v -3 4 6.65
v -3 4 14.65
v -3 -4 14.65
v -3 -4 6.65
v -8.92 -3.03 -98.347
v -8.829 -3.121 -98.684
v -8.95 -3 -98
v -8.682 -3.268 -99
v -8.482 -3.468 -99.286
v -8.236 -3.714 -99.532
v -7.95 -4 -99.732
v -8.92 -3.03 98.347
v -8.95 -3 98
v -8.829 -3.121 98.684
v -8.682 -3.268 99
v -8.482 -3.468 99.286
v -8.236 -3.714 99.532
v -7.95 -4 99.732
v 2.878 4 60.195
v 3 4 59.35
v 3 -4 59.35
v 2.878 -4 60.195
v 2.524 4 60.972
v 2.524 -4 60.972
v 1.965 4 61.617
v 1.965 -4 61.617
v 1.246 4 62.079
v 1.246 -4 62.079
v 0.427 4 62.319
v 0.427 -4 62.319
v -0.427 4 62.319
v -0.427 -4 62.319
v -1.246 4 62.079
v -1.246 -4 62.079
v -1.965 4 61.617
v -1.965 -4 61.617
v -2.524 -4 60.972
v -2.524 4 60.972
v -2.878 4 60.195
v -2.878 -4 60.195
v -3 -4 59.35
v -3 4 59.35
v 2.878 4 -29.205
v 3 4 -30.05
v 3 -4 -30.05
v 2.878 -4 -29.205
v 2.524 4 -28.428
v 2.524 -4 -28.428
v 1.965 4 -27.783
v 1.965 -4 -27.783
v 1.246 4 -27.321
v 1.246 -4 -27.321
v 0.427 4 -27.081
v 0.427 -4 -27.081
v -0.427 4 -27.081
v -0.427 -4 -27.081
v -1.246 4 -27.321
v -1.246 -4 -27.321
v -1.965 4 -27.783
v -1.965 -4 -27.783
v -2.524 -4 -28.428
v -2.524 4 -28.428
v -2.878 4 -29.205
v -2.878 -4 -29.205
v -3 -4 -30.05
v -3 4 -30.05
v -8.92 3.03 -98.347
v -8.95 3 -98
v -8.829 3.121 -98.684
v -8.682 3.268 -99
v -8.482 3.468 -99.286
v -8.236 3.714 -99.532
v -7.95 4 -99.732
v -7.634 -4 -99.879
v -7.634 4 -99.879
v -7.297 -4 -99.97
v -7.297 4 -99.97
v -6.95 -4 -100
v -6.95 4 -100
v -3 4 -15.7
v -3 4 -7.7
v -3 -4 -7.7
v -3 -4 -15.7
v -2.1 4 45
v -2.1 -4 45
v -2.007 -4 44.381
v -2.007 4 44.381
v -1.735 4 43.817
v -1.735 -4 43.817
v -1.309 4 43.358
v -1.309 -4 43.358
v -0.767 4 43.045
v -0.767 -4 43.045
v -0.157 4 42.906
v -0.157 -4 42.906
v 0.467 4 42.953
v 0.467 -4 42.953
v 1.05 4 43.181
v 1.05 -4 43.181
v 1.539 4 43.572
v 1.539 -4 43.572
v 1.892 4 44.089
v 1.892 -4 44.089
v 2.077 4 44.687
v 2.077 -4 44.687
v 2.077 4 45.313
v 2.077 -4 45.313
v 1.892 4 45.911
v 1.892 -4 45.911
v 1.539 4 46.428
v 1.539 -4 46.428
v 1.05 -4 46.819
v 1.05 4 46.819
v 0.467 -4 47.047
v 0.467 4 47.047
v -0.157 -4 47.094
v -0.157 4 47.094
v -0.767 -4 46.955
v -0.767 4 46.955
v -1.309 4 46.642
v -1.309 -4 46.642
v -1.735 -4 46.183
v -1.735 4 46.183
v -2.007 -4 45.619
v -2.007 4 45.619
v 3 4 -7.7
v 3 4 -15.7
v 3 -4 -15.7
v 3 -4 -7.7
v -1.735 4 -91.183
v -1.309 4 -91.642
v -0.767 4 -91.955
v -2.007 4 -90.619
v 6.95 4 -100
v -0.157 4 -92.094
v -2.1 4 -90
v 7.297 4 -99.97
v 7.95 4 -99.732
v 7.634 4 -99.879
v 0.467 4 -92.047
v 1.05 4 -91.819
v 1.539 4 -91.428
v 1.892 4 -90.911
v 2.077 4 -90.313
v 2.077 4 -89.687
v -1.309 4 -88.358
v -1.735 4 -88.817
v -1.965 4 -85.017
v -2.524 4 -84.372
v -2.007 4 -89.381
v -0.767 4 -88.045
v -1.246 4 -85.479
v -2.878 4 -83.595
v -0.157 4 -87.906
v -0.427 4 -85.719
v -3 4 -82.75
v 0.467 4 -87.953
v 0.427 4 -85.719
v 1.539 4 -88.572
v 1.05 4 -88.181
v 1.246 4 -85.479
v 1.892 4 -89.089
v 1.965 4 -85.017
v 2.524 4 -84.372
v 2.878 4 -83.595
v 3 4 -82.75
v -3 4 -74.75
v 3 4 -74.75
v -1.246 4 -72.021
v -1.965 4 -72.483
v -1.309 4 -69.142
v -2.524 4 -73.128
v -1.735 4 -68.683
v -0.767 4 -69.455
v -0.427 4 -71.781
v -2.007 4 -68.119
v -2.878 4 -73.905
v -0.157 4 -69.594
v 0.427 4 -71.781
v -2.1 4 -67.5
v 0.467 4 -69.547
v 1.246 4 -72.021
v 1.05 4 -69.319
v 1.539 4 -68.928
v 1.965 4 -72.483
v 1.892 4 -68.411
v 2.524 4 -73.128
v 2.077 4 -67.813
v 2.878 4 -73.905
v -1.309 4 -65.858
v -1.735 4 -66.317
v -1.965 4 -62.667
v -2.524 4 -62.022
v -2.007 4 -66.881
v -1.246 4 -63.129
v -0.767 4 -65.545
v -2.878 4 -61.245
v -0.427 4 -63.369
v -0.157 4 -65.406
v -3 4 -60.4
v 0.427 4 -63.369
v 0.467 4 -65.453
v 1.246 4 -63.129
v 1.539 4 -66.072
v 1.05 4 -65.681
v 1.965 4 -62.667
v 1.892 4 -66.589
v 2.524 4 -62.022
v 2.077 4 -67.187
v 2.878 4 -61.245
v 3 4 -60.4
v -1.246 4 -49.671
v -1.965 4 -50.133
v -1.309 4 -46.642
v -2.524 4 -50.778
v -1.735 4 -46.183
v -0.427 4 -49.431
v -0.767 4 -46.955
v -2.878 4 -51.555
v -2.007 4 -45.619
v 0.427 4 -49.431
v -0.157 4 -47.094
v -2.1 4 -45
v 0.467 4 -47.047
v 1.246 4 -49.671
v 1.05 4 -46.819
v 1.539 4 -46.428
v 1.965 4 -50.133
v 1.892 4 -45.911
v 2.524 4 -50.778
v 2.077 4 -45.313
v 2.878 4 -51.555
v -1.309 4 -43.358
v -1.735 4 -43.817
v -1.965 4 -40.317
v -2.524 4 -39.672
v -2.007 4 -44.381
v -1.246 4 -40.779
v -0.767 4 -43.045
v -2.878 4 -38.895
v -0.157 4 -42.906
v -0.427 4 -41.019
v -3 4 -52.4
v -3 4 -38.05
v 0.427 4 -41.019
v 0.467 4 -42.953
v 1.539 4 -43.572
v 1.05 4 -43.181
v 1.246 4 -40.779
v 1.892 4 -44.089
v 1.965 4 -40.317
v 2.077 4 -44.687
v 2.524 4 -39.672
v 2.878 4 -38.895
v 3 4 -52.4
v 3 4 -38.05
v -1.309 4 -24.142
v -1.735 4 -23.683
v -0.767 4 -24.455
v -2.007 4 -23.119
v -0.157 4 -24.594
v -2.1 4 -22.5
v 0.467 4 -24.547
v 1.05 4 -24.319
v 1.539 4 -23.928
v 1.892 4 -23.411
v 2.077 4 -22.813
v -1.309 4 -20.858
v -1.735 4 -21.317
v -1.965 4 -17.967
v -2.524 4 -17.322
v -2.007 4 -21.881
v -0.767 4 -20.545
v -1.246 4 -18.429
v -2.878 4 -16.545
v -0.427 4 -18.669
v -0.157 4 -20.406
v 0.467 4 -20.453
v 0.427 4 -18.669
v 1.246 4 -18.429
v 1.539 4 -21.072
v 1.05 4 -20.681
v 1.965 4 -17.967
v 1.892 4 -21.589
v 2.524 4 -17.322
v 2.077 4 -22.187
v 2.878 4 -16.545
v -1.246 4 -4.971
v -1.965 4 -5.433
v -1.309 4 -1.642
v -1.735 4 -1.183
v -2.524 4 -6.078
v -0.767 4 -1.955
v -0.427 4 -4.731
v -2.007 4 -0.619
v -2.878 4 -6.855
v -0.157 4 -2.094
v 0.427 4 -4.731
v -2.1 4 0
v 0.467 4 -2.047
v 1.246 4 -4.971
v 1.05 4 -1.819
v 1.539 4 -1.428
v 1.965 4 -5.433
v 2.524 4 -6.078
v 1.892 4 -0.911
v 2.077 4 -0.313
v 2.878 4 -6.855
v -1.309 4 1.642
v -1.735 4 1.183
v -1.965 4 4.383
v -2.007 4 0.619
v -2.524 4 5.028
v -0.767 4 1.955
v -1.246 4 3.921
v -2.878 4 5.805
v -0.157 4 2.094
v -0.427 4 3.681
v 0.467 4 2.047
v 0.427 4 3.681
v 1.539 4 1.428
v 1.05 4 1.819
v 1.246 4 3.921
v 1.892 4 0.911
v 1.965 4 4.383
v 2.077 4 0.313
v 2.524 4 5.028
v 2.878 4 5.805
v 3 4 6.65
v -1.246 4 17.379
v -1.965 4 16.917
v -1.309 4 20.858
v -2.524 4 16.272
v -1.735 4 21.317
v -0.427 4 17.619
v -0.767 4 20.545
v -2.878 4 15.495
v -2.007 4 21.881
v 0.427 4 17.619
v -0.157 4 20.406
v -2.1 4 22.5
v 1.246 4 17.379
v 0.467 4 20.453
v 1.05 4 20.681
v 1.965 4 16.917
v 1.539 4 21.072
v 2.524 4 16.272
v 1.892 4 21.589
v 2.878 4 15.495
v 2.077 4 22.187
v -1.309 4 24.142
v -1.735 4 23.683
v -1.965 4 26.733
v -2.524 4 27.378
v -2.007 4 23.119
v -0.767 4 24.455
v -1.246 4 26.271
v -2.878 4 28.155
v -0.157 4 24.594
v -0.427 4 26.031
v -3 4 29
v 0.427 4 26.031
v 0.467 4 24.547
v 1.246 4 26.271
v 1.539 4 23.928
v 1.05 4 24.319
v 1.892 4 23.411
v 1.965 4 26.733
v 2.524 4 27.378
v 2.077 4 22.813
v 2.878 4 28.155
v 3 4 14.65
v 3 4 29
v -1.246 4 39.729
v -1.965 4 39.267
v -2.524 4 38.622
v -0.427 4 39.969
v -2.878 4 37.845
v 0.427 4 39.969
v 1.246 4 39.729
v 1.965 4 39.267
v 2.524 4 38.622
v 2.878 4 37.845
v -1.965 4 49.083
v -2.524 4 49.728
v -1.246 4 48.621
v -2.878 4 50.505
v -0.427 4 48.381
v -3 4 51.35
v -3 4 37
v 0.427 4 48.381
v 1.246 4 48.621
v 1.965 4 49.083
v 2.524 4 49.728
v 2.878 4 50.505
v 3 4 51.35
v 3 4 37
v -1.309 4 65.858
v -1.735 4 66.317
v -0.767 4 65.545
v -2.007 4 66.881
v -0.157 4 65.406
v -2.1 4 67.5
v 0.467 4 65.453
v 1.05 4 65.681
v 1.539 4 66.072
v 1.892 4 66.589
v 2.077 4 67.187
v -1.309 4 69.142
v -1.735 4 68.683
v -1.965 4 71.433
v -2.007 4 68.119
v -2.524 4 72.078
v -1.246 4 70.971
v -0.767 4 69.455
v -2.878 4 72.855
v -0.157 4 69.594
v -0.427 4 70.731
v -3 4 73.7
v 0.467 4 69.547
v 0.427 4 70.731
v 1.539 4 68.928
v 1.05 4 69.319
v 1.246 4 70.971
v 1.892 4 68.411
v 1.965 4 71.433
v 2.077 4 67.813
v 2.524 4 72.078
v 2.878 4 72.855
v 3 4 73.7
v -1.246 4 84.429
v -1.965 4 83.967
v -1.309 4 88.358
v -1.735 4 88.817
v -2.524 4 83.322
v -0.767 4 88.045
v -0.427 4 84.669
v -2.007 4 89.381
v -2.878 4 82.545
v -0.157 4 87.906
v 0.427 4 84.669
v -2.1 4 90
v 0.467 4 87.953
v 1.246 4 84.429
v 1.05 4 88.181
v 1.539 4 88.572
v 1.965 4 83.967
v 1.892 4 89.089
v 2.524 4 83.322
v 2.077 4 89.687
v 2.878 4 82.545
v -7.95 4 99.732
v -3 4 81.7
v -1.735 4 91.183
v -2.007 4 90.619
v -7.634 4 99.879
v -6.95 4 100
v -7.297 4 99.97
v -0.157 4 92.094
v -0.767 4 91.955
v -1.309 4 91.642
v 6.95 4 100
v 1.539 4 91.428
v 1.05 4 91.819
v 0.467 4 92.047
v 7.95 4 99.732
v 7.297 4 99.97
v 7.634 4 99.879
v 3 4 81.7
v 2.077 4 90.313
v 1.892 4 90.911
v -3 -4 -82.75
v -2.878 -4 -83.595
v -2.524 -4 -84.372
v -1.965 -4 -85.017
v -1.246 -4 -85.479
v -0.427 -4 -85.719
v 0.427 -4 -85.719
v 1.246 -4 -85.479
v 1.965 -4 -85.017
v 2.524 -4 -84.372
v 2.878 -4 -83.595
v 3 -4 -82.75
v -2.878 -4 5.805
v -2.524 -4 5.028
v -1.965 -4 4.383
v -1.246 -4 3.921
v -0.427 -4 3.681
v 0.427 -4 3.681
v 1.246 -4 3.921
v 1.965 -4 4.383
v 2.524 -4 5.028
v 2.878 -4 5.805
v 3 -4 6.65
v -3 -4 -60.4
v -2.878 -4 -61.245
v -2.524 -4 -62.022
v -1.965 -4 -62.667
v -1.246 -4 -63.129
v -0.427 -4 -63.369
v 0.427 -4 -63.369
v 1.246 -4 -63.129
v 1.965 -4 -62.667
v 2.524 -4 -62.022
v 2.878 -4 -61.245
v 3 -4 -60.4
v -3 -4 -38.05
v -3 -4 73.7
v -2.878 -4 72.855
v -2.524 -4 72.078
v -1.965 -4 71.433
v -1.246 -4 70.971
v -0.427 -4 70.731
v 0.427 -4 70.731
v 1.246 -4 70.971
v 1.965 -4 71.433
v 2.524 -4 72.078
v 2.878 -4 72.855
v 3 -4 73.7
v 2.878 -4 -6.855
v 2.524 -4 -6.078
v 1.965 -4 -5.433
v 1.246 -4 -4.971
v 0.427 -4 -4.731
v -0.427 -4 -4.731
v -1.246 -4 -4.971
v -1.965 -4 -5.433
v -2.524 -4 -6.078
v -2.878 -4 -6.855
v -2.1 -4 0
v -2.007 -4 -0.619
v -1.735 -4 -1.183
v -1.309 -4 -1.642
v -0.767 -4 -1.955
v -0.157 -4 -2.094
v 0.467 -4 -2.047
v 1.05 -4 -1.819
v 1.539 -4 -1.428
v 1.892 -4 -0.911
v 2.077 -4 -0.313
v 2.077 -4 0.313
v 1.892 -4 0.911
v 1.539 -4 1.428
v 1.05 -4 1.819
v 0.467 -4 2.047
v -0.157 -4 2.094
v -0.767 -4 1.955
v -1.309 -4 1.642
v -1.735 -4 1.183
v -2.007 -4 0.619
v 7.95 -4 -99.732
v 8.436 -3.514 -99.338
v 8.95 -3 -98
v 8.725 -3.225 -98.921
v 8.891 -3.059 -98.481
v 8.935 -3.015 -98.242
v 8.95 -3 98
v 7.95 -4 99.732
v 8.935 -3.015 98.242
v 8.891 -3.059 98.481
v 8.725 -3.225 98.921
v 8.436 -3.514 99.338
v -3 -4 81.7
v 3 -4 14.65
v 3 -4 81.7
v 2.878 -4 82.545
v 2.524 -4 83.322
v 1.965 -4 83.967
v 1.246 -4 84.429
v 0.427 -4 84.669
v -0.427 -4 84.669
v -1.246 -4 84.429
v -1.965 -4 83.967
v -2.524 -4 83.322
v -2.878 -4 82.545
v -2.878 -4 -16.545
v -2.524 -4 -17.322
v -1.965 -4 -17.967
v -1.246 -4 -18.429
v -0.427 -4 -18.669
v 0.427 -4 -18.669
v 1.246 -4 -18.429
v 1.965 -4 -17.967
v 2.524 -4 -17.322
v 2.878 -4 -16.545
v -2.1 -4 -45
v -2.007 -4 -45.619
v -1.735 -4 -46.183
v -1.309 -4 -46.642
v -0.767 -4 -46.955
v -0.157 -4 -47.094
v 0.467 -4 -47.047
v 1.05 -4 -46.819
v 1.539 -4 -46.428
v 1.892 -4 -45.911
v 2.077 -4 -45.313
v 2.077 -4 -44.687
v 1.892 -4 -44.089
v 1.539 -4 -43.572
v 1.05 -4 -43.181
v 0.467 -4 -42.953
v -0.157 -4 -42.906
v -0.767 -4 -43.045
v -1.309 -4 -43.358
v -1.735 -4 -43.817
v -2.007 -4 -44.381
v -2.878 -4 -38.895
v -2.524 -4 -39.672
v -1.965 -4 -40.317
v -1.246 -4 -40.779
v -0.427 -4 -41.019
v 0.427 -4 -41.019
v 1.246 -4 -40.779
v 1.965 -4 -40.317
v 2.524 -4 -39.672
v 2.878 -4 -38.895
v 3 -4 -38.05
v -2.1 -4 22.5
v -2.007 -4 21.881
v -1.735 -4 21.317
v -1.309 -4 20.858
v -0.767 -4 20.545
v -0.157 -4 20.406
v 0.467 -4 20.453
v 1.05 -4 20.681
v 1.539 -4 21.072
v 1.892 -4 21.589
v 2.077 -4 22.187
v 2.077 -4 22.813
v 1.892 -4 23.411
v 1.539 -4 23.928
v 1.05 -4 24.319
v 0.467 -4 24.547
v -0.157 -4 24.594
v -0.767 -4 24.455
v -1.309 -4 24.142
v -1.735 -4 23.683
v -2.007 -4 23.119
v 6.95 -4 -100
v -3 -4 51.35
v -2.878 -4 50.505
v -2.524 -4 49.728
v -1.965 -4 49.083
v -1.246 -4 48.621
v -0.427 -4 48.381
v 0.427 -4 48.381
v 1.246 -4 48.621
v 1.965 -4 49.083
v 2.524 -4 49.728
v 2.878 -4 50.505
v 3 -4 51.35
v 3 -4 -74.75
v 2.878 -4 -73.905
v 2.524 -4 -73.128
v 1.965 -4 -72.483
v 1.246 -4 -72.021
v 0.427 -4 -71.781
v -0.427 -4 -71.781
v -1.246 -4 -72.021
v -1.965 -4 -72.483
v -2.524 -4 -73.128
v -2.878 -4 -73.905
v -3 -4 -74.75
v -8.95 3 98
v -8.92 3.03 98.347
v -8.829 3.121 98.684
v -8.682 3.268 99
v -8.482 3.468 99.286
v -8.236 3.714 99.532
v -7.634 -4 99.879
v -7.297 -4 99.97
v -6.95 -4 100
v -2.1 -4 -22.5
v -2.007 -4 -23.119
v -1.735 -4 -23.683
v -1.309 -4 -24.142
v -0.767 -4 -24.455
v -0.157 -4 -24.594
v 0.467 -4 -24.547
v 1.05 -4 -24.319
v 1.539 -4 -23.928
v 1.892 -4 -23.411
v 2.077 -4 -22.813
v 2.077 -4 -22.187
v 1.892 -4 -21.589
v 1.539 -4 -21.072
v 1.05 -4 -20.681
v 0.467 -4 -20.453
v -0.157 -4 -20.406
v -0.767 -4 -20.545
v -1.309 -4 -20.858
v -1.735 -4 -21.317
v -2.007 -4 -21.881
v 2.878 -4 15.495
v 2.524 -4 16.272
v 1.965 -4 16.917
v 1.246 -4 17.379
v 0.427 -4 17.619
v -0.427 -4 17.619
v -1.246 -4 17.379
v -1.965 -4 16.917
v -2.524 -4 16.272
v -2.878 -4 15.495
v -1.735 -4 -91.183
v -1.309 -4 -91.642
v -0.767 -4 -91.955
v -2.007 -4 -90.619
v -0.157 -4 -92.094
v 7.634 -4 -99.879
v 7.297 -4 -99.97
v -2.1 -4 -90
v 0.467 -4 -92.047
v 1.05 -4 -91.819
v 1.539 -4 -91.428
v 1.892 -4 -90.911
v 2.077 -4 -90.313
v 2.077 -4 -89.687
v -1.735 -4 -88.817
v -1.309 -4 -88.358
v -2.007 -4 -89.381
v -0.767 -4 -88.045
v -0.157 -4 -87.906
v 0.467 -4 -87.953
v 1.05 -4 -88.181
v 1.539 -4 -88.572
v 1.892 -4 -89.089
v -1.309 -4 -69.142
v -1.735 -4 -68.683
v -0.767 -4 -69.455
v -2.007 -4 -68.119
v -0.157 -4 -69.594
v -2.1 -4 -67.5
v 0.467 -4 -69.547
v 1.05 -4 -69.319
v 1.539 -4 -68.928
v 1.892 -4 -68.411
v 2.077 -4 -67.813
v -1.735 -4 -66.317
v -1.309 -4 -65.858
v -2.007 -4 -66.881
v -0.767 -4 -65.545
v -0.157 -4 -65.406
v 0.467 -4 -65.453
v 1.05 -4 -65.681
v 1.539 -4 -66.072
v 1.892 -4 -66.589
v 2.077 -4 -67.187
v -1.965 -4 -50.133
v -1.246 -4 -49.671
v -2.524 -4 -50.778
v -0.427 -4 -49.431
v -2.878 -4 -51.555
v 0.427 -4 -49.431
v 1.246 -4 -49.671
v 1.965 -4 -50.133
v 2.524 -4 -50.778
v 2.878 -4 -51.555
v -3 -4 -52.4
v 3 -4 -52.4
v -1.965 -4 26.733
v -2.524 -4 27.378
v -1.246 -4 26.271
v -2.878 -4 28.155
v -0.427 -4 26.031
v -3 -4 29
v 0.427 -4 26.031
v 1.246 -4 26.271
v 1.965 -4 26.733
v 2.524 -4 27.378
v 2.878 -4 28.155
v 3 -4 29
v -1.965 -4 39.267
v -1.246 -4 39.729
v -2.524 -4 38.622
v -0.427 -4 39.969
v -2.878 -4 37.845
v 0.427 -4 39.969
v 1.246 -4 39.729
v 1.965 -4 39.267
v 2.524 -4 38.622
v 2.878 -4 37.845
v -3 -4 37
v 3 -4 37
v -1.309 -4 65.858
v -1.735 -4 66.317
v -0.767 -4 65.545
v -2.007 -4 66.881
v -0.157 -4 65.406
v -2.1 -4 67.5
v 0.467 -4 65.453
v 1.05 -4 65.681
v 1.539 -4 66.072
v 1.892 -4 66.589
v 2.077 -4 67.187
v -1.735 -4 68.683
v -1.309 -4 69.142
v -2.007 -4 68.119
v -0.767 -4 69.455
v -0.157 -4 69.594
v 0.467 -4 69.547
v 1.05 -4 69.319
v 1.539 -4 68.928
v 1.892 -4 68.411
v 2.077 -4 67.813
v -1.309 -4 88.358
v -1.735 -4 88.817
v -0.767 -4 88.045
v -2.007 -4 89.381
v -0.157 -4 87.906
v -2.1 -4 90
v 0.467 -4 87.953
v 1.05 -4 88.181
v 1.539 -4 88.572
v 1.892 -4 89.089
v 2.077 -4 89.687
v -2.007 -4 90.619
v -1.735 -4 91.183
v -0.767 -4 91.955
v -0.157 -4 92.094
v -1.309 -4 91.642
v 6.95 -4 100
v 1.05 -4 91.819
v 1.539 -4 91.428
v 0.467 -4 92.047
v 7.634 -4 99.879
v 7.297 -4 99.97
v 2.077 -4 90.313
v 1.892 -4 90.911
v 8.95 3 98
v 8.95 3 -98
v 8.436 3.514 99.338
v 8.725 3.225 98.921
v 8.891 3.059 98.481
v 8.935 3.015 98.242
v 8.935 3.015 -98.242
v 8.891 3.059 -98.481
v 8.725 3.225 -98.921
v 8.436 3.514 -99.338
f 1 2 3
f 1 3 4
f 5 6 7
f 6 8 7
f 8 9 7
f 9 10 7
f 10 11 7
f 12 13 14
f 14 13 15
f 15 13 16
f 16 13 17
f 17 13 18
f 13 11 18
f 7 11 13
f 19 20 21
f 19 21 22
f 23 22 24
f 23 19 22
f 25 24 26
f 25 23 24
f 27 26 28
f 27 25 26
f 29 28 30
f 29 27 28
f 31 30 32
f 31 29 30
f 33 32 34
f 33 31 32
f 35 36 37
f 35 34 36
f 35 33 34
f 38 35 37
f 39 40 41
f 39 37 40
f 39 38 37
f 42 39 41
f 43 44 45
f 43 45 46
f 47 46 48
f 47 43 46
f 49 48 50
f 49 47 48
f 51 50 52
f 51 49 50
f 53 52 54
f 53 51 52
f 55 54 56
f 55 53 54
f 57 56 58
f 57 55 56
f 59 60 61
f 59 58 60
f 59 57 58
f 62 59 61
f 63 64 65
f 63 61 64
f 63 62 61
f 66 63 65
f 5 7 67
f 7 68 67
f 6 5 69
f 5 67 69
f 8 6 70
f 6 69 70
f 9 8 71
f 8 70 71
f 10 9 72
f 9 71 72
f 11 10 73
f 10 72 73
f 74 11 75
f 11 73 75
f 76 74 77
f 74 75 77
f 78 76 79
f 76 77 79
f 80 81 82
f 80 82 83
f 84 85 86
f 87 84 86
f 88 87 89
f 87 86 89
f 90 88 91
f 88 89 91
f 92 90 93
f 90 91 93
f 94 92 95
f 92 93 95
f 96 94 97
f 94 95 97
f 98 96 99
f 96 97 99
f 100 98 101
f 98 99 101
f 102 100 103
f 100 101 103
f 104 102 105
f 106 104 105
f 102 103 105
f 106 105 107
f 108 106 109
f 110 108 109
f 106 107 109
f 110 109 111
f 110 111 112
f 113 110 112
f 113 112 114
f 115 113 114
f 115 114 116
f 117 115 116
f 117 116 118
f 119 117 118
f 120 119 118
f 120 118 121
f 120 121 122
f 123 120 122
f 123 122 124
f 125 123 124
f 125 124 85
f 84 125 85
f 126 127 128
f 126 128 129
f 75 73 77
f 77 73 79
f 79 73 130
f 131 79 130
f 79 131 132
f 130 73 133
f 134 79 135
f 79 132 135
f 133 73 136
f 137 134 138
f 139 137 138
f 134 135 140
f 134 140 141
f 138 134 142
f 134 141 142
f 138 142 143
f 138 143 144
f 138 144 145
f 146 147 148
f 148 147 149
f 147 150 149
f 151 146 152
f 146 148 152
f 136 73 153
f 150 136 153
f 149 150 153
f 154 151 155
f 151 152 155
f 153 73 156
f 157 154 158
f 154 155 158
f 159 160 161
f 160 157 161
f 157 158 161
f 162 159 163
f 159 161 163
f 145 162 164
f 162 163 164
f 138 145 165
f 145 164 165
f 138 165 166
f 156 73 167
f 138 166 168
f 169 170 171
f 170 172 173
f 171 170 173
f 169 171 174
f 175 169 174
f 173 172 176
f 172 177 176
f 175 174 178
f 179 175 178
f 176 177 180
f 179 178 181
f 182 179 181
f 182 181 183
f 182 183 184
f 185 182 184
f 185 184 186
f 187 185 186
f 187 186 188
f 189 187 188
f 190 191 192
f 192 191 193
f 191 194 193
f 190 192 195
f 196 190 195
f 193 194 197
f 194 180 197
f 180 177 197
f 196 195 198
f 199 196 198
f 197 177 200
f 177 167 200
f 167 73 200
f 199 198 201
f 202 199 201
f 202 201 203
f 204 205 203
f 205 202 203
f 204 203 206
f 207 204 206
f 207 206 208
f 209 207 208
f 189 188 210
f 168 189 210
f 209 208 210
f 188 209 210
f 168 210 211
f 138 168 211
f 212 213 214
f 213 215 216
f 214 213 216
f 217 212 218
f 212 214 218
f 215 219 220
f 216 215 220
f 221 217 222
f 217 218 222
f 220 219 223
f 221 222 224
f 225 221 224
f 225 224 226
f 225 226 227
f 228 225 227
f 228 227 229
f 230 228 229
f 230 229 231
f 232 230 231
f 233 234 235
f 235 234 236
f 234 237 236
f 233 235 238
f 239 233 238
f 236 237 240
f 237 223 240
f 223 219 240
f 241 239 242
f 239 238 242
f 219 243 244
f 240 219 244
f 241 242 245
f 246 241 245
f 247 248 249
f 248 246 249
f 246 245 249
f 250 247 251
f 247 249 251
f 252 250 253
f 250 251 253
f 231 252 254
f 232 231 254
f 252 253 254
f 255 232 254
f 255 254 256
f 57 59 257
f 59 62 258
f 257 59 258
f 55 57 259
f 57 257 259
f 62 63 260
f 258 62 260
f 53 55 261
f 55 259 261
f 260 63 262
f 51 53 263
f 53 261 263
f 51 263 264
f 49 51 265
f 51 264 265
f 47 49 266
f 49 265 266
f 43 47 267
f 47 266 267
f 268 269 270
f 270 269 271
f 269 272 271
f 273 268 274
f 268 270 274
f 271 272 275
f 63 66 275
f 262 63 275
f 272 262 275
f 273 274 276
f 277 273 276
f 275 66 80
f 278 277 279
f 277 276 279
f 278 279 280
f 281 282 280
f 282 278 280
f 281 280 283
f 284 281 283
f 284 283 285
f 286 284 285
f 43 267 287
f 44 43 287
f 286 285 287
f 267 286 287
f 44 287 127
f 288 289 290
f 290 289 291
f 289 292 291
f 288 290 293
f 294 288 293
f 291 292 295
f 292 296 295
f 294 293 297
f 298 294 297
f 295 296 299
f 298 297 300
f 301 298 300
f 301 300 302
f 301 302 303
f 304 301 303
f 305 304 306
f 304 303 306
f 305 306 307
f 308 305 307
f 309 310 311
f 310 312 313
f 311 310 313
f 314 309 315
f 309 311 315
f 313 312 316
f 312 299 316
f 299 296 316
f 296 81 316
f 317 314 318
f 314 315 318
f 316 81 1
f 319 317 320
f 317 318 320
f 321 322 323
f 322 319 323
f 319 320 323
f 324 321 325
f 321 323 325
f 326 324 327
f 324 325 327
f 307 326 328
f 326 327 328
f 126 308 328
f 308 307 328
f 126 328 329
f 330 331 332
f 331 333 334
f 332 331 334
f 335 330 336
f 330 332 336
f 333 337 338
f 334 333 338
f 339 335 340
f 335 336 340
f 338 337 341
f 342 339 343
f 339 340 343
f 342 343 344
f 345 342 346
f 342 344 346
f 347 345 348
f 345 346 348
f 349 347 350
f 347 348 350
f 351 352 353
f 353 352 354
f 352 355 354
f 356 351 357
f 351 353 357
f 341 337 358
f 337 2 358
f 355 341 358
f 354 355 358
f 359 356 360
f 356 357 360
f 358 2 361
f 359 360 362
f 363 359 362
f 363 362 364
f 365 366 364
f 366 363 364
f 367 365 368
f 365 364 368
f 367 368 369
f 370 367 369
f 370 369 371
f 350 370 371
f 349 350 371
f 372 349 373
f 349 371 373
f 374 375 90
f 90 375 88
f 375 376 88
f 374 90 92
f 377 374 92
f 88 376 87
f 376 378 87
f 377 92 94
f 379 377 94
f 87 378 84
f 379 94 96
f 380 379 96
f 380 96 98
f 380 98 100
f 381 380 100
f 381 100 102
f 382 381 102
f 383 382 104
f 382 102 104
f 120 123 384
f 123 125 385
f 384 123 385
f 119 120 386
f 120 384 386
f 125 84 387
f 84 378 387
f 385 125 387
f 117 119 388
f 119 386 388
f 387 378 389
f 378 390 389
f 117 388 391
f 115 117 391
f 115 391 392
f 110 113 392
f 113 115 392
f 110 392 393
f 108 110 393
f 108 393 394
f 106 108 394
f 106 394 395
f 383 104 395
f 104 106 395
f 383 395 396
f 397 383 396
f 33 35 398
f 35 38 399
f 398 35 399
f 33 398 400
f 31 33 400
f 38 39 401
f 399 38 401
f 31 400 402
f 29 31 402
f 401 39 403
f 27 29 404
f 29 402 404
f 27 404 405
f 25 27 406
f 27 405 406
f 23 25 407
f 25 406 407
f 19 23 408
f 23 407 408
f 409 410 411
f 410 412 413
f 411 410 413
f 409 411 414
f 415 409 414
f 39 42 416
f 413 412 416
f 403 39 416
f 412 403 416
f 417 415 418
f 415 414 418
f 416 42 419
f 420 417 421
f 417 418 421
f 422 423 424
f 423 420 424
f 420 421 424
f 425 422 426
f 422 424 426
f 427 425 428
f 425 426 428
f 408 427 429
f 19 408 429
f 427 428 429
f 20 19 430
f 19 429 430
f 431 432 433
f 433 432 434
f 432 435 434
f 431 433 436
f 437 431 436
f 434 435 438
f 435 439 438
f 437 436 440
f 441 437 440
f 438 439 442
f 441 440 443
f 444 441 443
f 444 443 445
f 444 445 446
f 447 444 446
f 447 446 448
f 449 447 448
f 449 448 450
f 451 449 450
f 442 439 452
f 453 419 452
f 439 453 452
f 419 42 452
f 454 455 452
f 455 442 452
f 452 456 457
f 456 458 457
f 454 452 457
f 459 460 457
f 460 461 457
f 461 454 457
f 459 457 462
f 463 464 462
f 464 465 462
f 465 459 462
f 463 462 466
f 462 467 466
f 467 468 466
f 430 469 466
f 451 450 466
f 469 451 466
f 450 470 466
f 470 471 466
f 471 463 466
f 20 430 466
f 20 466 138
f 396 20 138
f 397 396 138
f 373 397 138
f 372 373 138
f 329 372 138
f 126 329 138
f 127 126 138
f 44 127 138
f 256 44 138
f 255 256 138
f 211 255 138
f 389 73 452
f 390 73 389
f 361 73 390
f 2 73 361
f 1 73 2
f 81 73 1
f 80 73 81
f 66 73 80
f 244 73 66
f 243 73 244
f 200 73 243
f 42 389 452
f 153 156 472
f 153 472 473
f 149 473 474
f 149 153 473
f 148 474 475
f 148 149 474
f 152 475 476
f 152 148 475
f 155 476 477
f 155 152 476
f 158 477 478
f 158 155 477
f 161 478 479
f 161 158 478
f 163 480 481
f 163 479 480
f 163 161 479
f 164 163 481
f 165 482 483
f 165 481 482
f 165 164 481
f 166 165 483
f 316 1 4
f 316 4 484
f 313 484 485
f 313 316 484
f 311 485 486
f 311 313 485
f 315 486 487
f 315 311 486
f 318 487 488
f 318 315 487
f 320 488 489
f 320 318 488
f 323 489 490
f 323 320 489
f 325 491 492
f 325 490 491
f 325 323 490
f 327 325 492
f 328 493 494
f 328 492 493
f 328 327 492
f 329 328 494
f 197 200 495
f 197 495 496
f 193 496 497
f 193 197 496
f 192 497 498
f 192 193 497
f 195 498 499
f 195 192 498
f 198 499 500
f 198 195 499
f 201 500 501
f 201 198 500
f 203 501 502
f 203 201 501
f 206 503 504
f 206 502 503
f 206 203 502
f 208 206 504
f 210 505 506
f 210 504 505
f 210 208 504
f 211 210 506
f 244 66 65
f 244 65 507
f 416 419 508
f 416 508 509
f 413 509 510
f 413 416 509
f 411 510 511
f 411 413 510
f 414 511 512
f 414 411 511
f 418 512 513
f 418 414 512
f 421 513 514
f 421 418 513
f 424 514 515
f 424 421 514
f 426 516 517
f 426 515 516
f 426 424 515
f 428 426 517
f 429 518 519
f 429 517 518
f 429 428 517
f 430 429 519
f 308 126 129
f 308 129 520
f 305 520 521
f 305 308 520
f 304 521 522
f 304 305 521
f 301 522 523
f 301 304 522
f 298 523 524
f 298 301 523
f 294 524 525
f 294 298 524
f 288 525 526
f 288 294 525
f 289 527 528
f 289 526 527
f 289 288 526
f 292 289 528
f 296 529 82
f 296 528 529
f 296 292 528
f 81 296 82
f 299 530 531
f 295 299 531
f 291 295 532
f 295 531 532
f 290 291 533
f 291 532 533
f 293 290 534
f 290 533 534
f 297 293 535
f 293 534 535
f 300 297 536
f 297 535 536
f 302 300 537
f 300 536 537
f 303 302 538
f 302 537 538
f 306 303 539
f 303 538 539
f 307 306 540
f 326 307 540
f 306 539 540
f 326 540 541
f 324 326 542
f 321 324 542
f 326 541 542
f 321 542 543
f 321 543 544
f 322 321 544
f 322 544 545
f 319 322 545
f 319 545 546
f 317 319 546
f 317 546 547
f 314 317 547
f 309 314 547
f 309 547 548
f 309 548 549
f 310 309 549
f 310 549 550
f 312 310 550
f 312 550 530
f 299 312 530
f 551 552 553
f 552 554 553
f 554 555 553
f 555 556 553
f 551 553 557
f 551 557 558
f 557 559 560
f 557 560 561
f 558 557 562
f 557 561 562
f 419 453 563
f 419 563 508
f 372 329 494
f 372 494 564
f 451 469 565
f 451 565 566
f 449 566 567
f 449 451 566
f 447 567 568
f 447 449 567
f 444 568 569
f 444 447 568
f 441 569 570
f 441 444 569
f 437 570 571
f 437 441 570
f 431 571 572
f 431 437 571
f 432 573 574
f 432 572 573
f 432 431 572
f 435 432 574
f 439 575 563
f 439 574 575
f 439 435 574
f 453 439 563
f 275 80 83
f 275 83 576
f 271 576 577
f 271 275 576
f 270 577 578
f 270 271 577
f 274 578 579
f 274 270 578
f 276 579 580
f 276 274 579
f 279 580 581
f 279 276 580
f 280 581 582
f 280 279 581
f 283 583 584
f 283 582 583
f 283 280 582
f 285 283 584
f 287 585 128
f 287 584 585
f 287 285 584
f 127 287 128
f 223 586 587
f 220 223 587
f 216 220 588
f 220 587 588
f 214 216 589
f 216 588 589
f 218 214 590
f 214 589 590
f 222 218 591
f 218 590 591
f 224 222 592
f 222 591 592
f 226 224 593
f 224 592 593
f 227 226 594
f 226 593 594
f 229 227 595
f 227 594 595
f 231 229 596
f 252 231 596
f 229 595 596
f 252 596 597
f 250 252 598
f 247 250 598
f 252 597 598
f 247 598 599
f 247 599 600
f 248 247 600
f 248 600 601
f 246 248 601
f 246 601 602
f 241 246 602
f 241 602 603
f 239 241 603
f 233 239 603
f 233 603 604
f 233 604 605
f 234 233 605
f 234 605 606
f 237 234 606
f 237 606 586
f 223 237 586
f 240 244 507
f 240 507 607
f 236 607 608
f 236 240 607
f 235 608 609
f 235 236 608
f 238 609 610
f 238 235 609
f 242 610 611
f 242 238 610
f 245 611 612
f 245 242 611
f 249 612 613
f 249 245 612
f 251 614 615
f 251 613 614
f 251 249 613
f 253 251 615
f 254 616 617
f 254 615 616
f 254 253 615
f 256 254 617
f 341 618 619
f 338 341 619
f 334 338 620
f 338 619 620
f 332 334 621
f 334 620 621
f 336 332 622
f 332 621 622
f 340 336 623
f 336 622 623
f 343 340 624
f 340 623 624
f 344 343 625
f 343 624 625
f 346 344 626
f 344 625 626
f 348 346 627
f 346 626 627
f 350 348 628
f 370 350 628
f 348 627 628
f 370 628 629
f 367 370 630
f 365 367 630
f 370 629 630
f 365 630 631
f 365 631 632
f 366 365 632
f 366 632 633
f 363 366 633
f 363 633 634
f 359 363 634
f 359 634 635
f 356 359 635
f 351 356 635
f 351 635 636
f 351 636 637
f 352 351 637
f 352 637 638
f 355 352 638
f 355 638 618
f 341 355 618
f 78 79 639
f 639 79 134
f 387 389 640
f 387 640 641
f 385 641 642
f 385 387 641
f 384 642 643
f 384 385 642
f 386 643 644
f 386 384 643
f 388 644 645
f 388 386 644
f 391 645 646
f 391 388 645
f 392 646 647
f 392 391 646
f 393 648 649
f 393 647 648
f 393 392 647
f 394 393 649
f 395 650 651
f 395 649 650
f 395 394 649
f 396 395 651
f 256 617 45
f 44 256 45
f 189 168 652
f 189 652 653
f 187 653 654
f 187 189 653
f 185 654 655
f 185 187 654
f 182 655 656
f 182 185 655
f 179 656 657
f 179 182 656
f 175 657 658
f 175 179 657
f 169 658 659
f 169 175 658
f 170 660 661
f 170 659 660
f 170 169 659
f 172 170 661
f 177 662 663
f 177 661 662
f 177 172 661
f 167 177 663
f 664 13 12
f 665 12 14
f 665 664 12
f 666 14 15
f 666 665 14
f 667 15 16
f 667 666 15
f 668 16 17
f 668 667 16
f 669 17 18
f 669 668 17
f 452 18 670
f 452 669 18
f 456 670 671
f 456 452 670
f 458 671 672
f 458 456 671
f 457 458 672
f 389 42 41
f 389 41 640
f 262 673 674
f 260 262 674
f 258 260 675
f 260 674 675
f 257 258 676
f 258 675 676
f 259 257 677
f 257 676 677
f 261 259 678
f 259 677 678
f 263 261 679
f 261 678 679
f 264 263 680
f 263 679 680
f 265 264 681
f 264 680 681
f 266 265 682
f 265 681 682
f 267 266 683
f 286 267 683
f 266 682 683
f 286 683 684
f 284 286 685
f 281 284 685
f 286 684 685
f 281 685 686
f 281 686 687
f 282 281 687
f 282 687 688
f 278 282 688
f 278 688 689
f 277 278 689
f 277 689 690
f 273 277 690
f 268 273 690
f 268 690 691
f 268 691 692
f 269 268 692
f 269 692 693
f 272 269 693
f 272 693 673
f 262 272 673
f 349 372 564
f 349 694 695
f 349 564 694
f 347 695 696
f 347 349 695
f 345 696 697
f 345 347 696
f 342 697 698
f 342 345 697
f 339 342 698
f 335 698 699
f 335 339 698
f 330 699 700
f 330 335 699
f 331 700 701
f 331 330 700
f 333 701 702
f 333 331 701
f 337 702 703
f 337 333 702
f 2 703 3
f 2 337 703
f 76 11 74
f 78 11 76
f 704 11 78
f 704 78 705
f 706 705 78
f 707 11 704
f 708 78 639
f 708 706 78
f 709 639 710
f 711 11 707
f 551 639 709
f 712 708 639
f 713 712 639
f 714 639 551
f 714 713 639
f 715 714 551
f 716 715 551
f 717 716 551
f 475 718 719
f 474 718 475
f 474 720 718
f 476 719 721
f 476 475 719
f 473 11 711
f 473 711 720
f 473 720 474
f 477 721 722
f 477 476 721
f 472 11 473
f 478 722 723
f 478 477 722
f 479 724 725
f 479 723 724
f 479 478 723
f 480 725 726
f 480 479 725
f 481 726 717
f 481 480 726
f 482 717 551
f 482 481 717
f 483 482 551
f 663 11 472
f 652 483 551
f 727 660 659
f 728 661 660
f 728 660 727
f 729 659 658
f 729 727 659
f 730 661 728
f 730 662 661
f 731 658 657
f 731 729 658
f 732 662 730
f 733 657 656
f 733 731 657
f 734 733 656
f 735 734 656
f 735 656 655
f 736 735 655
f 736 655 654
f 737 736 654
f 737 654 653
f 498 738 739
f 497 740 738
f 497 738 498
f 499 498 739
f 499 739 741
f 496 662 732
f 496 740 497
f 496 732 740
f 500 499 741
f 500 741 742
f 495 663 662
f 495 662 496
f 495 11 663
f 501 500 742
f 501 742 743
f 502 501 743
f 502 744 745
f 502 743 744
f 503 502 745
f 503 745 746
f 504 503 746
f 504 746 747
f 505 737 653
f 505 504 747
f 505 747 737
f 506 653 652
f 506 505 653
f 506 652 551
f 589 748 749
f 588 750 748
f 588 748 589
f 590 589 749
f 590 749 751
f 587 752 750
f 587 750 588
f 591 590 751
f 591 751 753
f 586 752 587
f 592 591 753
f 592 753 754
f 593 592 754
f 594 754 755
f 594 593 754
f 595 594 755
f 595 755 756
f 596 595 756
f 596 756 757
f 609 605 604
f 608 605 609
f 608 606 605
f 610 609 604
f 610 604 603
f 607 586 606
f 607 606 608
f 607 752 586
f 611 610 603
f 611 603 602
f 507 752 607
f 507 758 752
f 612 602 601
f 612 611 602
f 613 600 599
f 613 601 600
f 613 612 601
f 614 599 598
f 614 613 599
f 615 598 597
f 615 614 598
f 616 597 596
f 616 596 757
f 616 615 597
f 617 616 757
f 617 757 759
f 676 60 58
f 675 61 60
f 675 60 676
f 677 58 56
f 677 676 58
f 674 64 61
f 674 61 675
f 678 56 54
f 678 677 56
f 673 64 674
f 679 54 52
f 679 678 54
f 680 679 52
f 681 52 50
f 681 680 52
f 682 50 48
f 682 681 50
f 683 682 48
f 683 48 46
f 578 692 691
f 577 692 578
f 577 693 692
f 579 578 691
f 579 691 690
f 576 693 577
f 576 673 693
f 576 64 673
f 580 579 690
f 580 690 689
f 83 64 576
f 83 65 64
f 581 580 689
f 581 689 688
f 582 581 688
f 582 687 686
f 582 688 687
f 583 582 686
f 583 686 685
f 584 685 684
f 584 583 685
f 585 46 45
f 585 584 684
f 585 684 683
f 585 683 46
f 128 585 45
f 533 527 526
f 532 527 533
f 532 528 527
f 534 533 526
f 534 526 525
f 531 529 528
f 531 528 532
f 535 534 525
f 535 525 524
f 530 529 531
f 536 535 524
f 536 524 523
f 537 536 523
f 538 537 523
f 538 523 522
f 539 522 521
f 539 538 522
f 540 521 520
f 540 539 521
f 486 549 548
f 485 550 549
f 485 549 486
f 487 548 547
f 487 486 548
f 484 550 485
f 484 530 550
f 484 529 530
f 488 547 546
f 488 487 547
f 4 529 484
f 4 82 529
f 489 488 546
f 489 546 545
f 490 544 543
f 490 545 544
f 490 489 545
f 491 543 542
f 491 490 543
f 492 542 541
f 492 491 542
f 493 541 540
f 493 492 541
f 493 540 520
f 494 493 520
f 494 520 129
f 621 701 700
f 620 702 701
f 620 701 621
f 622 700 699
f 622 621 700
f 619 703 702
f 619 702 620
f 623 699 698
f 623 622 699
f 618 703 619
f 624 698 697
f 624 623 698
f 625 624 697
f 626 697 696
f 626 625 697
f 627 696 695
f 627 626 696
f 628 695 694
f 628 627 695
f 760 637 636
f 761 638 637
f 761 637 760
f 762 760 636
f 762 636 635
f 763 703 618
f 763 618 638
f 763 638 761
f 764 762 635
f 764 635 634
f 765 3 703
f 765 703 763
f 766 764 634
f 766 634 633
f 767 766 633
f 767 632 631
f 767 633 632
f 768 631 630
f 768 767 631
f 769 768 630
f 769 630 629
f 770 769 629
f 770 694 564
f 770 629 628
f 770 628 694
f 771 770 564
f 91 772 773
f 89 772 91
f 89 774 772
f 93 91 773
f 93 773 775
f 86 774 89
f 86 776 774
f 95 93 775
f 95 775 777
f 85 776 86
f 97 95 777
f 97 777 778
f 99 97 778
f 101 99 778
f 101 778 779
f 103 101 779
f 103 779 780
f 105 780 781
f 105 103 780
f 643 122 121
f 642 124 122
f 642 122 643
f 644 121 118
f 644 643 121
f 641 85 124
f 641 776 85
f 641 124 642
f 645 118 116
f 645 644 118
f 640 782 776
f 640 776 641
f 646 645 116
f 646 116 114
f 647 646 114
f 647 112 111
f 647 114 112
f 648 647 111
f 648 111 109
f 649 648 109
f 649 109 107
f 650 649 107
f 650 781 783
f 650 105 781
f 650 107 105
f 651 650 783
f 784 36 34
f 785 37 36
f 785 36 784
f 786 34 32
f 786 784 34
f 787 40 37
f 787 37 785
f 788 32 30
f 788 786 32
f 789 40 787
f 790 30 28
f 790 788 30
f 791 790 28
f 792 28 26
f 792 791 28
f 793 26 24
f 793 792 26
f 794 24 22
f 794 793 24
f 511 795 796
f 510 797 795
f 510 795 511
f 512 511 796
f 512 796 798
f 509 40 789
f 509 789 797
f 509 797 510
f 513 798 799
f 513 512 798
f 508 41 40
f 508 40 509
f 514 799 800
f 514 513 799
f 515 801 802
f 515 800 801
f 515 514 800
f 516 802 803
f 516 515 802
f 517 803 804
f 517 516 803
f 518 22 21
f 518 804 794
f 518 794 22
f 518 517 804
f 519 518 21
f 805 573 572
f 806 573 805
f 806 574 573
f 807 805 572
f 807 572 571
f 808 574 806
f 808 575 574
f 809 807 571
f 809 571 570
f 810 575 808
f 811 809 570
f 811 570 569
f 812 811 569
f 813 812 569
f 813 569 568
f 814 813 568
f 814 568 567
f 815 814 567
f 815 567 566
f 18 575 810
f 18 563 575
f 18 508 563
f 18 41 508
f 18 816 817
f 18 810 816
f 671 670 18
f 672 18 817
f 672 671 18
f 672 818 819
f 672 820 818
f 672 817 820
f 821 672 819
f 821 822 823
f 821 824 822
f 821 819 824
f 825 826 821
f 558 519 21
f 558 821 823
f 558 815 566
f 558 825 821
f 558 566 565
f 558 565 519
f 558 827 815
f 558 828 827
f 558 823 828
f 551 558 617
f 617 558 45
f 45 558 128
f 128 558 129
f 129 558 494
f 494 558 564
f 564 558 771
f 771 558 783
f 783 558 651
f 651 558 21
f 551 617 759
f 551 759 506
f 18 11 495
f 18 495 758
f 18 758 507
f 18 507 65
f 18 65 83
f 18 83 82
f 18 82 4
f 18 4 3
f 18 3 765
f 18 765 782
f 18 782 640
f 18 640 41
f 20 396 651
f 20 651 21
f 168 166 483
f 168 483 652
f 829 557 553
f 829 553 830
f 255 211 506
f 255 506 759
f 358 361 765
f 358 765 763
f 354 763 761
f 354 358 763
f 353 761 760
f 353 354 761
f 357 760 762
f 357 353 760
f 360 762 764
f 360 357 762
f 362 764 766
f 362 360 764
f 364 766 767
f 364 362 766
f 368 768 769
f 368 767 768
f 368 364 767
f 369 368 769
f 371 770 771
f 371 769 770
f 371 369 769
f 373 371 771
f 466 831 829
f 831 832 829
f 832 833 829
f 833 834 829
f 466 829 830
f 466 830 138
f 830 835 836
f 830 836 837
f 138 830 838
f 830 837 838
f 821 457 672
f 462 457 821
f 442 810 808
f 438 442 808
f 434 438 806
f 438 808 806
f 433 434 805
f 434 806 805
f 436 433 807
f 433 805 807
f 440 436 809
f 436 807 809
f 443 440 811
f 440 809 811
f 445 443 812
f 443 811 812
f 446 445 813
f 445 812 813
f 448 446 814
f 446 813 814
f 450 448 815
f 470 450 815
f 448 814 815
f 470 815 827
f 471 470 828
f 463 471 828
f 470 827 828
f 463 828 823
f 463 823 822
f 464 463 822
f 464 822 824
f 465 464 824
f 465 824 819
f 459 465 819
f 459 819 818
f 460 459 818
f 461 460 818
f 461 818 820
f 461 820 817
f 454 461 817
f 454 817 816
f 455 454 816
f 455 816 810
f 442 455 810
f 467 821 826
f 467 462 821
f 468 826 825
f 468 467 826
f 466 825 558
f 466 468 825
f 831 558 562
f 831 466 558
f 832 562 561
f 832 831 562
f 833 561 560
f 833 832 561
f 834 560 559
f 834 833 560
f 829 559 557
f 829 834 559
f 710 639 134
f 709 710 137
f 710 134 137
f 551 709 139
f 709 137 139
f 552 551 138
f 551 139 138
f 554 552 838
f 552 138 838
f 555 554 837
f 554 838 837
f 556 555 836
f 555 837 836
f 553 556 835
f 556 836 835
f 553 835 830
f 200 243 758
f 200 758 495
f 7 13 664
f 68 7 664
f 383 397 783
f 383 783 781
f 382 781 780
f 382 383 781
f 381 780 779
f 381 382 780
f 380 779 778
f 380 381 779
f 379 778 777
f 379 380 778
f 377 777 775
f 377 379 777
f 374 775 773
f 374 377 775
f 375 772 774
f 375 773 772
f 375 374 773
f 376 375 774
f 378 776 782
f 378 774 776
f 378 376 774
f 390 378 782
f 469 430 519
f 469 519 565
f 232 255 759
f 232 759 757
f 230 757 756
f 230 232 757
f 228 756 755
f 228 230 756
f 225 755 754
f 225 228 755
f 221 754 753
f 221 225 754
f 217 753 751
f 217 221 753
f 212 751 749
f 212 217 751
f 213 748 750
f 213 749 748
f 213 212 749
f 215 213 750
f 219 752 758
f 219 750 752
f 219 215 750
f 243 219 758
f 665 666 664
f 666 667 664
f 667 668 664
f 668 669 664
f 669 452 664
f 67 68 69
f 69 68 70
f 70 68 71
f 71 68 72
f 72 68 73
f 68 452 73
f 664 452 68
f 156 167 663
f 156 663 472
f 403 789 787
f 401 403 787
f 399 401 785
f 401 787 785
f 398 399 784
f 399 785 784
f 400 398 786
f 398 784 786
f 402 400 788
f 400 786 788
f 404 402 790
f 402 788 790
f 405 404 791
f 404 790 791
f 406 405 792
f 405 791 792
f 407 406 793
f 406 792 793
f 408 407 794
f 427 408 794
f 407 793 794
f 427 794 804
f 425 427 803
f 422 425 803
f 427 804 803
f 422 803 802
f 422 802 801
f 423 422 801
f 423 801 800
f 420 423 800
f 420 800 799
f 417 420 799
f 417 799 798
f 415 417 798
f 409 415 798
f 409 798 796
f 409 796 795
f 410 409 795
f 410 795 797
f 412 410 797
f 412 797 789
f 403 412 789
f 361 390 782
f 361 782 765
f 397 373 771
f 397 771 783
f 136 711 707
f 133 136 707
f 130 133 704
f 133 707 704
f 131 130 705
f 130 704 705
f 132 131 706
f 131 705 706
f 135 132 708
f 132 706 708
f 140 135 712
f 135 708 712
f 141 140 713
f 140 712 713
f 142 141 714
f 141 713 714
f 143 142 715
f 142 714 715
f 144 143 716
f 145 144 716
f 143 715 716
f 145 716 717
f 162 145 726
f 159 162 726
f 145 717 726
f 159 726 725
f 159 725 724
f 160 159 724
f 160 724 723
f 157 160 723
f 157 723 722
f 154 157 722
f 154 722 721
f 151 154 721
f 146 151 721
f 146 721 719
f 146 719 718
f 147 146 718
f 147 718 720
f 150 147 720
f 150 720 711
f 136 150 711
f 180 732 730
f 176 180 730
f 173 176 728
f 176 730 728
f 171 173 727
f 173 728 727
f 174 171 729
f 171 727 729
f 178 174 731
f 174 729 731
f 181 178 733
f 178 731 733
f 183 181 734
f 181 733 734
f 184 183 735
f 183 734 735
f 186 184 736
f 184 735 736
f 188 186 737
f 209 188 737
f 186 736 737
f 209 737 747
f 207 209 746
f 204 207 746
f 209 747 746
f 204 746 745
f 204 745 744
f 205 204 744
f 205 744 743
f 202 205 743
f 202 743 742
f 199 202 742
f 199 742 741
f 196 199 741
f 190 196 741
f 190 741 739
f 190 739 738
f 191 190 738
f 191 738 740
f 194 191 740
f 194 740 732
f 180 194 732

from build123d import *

# Parameters (mm, degrees)
SKETCH_1_W             = 17.9
SKETCH_1_H             = 8
EXTRUDE_1_DEPTH        = 100
SKETCH_2_R             = 1.5
CUT_EXTRUDE_1_DEPTH    = 100
HOLE_WIZARD_M5_1_D     = 4.2
HOLE_WIZARD_M5_1_DEPTH = 12.4
HOLE_WIZARD_M5_1_TIP   = 1.2618073
CHAMFER_1_SIZE         = 1
FILLET_1_R             = 2
HOLE_WIZARD_M5_2_D     = 4.2
HOLE_WIZARD_M5_2_DEPTH = 12.4
HOLE_WIZARD_M5_2_TIP   = 1.2618073
CUT_EXTRUDE_2_DEPTH    = 10


with BuildPart() as part:
    # 草图1 → 凸台-拉伸1 (new, symmetric)
    with BuildSketch(Plane.XY):
        Rectangle(SKETCH_1_W, SKETCH_1_H)
    extrude(amount=EXTRUDE_1_DEPTH, both=True)

    # 草图2 → 切除-拉伸1 (cut, symmetric)
    with BuildSketch(Plane(origin=(0, 4, 0), x_dir=(1, 0, 0), z_dir=(0, 1, 0))):
        with Locations(Location((0, 90, 0), (0, 0, 270))):
            Circle(SKETCH_2_R)
        with Locations(Location((0, 45, 0), (0, 0, 270))):
            Circle(SKETCH_2_R)
        with Locations(Location((0, 0, 0), (0, 0, 270))):
            Circle(SKETCH_2_R)
        with Locations(Location((0, -45, 0), (0, 0, 270))):
            Circle(SKETCH_2_R)
        with Locations(Location((0, -90, 0), (0, 0, 270))):
            Circle(SKETCH_2_R)
    extrude(amount=CUT_EXTRUDE_1_DEPTH, both=True, mode=Mode.SUBTRACT)

    # M5 螺纹孔1
    with Locations(Plane(origin=(0, 4, 0), x_dir=(1, 0, 0), z_dir=(0, 1, 0))):
        with Locations((0, 90), (0, 45), (0, 0), (0, -45), (0, -90)):
            Hole(HOLE_WIZARD_M5_1_D / 2, depth=HOLE_WIZARD_M5_1_DEPTH)
            with Locations((0, 0, -(HOLE_WIZARD_M5_1_DEPTH + HOLE_WIZARD_M5_1_TIP / 2))):  # 118° drill point
                Cone(0, HOLE_WIZARD_M5_1_D / 2, HOLE_WIZARD_M5_1_TIP, mode=Mode.SUBTRACT)

    # 倒角1
    chamfer_1_edges = [part.edges().sort_by_distance(p)[0] for p in [
        (8.95, -4, 0),
        (-8.95, -4, 0),
        (-8.95, 4, 0),
        (8.95, 4, 0),
    ]]
    chamfer(chamfer_1_edges, length=CHAMFER_1_SIZE)

    # 圆角1
    fillet_1_edges = [part.edges().sort_by_distance(p)[0] for p in [
        (8.95, 0, -100),
        (-8.95, 0, -100),
        (-8.95, 0, 100),
        (8.95, 0, 100),
    ]]
    fillet(fillet_1_edges, radius=FILLET_1_R)

    # M5 螺纹孔2
    with Locations(Plane(origin=(0, 4, 0), x_dir=(1, 0, 0), z_dir=(0, 1, 0))):
        with Locations((0, 67.5), (0, 22.5), (0, -22.5), (0, -67.5)):
            Hole(HOLE_WIZARD_M5_2_D / 2, depth=HOLE_WIZARD_M5_2_DEPTH)
            with Locations((0, 0, -(HOLE_WIZARD_M5_2_DEPTH + HOLE_WIZARD_M5_2_TIP / 2))):  # 118° drill point
                Cone(0, HOLE_WIZARD_M5_2_D / 2, HOLE_WIZARD_M5_2_TIP, mode=Mode.SUBTRACT)

    # 草图8 → 切除-拉伸2 (cut)
    with BuildSketch(Plane(origin=(0, 4, 0), x_dir=(1, 0, 0), z_dir=(0, 1, 0))):
        with BuildLine():
            Line((3, 82.75), (3, 74.75))
            ThreePointArc((3, 74.75), (0, 71.75), (-3, 74.75))
            Line((-3, 74.75), (-3, 82.75))
            ThreePointArc((-3, 82.75), (0, 85.75), (3, 82.75))
        make_face()
        with BuildLine():
            Line((3, 60.4), (3, 52.4))
            ThreePointArc((3, 52.4), (0, 49.4), (-3, 52.4))
            Line((-3, 52.4), (-3, 60.4))
            ThreePointArc((-3, 60.4), (0, 63.4), (3, 60.4))
        make_face()
        with BuildLine():
            Line((3, 38.05), (3, 30.05))
            ThreePointArc((3, 30.05), (0, 27.05), (-3, 30.05))
            Line((-3, 30.05), (-3, 38.05))
            ThreePointArc((-3, 38.05), (0, 41.05), (3, 38.05))
        make_face()
        with BuildLine():
            Line((3, 15.7), (3, 7.7))
            ThreePointArc((3, 7.7), (0, 4.7), (-3, 7.7))
            Line((-3, 7.7), (-3, 15.7))
            ThreePointArc((-3, 15.7), (0, 18.7), (3, 15.7))
        make_face()
        with BuildLine():
            Line((3, -6.65), (3, -14.65))
            ThreePointArc((3, -14.65), (0, -17.65), (-3, -14.65))
            Line((-3, -14.65), (-3, -6.65))
            ThreePointArc((-3, -6.65), (0, -3.65), (3, -6.65))
        make_face()
        with BuildLine():
            Line((3, -29), (3, -37))
            ThreePointArc((3, -37), (0, -40), (-3, -37))
            Line((-3, -37), (-3, -29))
            ThreePointArc((-3, -29), (0, -26), (3, -29))
        make_face()
        with BuildLine():
            Line((3, -51.35), (3, -59.35))
            ThreePointArc((3, -59.35), (0, -62.35), (-3, -59.35))
            Line((-3, -59.35), (-3, -51.35))
            ThreePointArc((-3, -51.35), (0, -48.35), (3, -51.35))
        make_face()
        with BuildLine():
            Line((3, -73.7), (3, -81.7))
            ThreePointArc((3, -81.7), (0, -84.7), (-3, -81.7))
            Line((-3, -81.7), (-3, -73.7))
            ThreePointArc((-3, -73.7), (0, -70.7), (3, -73.7))
        make_face()
    extrude(amount=-CUT_EXTRUDE_2_DEPTH, mode=Mode.SUBTRACT)


solid = part.part
